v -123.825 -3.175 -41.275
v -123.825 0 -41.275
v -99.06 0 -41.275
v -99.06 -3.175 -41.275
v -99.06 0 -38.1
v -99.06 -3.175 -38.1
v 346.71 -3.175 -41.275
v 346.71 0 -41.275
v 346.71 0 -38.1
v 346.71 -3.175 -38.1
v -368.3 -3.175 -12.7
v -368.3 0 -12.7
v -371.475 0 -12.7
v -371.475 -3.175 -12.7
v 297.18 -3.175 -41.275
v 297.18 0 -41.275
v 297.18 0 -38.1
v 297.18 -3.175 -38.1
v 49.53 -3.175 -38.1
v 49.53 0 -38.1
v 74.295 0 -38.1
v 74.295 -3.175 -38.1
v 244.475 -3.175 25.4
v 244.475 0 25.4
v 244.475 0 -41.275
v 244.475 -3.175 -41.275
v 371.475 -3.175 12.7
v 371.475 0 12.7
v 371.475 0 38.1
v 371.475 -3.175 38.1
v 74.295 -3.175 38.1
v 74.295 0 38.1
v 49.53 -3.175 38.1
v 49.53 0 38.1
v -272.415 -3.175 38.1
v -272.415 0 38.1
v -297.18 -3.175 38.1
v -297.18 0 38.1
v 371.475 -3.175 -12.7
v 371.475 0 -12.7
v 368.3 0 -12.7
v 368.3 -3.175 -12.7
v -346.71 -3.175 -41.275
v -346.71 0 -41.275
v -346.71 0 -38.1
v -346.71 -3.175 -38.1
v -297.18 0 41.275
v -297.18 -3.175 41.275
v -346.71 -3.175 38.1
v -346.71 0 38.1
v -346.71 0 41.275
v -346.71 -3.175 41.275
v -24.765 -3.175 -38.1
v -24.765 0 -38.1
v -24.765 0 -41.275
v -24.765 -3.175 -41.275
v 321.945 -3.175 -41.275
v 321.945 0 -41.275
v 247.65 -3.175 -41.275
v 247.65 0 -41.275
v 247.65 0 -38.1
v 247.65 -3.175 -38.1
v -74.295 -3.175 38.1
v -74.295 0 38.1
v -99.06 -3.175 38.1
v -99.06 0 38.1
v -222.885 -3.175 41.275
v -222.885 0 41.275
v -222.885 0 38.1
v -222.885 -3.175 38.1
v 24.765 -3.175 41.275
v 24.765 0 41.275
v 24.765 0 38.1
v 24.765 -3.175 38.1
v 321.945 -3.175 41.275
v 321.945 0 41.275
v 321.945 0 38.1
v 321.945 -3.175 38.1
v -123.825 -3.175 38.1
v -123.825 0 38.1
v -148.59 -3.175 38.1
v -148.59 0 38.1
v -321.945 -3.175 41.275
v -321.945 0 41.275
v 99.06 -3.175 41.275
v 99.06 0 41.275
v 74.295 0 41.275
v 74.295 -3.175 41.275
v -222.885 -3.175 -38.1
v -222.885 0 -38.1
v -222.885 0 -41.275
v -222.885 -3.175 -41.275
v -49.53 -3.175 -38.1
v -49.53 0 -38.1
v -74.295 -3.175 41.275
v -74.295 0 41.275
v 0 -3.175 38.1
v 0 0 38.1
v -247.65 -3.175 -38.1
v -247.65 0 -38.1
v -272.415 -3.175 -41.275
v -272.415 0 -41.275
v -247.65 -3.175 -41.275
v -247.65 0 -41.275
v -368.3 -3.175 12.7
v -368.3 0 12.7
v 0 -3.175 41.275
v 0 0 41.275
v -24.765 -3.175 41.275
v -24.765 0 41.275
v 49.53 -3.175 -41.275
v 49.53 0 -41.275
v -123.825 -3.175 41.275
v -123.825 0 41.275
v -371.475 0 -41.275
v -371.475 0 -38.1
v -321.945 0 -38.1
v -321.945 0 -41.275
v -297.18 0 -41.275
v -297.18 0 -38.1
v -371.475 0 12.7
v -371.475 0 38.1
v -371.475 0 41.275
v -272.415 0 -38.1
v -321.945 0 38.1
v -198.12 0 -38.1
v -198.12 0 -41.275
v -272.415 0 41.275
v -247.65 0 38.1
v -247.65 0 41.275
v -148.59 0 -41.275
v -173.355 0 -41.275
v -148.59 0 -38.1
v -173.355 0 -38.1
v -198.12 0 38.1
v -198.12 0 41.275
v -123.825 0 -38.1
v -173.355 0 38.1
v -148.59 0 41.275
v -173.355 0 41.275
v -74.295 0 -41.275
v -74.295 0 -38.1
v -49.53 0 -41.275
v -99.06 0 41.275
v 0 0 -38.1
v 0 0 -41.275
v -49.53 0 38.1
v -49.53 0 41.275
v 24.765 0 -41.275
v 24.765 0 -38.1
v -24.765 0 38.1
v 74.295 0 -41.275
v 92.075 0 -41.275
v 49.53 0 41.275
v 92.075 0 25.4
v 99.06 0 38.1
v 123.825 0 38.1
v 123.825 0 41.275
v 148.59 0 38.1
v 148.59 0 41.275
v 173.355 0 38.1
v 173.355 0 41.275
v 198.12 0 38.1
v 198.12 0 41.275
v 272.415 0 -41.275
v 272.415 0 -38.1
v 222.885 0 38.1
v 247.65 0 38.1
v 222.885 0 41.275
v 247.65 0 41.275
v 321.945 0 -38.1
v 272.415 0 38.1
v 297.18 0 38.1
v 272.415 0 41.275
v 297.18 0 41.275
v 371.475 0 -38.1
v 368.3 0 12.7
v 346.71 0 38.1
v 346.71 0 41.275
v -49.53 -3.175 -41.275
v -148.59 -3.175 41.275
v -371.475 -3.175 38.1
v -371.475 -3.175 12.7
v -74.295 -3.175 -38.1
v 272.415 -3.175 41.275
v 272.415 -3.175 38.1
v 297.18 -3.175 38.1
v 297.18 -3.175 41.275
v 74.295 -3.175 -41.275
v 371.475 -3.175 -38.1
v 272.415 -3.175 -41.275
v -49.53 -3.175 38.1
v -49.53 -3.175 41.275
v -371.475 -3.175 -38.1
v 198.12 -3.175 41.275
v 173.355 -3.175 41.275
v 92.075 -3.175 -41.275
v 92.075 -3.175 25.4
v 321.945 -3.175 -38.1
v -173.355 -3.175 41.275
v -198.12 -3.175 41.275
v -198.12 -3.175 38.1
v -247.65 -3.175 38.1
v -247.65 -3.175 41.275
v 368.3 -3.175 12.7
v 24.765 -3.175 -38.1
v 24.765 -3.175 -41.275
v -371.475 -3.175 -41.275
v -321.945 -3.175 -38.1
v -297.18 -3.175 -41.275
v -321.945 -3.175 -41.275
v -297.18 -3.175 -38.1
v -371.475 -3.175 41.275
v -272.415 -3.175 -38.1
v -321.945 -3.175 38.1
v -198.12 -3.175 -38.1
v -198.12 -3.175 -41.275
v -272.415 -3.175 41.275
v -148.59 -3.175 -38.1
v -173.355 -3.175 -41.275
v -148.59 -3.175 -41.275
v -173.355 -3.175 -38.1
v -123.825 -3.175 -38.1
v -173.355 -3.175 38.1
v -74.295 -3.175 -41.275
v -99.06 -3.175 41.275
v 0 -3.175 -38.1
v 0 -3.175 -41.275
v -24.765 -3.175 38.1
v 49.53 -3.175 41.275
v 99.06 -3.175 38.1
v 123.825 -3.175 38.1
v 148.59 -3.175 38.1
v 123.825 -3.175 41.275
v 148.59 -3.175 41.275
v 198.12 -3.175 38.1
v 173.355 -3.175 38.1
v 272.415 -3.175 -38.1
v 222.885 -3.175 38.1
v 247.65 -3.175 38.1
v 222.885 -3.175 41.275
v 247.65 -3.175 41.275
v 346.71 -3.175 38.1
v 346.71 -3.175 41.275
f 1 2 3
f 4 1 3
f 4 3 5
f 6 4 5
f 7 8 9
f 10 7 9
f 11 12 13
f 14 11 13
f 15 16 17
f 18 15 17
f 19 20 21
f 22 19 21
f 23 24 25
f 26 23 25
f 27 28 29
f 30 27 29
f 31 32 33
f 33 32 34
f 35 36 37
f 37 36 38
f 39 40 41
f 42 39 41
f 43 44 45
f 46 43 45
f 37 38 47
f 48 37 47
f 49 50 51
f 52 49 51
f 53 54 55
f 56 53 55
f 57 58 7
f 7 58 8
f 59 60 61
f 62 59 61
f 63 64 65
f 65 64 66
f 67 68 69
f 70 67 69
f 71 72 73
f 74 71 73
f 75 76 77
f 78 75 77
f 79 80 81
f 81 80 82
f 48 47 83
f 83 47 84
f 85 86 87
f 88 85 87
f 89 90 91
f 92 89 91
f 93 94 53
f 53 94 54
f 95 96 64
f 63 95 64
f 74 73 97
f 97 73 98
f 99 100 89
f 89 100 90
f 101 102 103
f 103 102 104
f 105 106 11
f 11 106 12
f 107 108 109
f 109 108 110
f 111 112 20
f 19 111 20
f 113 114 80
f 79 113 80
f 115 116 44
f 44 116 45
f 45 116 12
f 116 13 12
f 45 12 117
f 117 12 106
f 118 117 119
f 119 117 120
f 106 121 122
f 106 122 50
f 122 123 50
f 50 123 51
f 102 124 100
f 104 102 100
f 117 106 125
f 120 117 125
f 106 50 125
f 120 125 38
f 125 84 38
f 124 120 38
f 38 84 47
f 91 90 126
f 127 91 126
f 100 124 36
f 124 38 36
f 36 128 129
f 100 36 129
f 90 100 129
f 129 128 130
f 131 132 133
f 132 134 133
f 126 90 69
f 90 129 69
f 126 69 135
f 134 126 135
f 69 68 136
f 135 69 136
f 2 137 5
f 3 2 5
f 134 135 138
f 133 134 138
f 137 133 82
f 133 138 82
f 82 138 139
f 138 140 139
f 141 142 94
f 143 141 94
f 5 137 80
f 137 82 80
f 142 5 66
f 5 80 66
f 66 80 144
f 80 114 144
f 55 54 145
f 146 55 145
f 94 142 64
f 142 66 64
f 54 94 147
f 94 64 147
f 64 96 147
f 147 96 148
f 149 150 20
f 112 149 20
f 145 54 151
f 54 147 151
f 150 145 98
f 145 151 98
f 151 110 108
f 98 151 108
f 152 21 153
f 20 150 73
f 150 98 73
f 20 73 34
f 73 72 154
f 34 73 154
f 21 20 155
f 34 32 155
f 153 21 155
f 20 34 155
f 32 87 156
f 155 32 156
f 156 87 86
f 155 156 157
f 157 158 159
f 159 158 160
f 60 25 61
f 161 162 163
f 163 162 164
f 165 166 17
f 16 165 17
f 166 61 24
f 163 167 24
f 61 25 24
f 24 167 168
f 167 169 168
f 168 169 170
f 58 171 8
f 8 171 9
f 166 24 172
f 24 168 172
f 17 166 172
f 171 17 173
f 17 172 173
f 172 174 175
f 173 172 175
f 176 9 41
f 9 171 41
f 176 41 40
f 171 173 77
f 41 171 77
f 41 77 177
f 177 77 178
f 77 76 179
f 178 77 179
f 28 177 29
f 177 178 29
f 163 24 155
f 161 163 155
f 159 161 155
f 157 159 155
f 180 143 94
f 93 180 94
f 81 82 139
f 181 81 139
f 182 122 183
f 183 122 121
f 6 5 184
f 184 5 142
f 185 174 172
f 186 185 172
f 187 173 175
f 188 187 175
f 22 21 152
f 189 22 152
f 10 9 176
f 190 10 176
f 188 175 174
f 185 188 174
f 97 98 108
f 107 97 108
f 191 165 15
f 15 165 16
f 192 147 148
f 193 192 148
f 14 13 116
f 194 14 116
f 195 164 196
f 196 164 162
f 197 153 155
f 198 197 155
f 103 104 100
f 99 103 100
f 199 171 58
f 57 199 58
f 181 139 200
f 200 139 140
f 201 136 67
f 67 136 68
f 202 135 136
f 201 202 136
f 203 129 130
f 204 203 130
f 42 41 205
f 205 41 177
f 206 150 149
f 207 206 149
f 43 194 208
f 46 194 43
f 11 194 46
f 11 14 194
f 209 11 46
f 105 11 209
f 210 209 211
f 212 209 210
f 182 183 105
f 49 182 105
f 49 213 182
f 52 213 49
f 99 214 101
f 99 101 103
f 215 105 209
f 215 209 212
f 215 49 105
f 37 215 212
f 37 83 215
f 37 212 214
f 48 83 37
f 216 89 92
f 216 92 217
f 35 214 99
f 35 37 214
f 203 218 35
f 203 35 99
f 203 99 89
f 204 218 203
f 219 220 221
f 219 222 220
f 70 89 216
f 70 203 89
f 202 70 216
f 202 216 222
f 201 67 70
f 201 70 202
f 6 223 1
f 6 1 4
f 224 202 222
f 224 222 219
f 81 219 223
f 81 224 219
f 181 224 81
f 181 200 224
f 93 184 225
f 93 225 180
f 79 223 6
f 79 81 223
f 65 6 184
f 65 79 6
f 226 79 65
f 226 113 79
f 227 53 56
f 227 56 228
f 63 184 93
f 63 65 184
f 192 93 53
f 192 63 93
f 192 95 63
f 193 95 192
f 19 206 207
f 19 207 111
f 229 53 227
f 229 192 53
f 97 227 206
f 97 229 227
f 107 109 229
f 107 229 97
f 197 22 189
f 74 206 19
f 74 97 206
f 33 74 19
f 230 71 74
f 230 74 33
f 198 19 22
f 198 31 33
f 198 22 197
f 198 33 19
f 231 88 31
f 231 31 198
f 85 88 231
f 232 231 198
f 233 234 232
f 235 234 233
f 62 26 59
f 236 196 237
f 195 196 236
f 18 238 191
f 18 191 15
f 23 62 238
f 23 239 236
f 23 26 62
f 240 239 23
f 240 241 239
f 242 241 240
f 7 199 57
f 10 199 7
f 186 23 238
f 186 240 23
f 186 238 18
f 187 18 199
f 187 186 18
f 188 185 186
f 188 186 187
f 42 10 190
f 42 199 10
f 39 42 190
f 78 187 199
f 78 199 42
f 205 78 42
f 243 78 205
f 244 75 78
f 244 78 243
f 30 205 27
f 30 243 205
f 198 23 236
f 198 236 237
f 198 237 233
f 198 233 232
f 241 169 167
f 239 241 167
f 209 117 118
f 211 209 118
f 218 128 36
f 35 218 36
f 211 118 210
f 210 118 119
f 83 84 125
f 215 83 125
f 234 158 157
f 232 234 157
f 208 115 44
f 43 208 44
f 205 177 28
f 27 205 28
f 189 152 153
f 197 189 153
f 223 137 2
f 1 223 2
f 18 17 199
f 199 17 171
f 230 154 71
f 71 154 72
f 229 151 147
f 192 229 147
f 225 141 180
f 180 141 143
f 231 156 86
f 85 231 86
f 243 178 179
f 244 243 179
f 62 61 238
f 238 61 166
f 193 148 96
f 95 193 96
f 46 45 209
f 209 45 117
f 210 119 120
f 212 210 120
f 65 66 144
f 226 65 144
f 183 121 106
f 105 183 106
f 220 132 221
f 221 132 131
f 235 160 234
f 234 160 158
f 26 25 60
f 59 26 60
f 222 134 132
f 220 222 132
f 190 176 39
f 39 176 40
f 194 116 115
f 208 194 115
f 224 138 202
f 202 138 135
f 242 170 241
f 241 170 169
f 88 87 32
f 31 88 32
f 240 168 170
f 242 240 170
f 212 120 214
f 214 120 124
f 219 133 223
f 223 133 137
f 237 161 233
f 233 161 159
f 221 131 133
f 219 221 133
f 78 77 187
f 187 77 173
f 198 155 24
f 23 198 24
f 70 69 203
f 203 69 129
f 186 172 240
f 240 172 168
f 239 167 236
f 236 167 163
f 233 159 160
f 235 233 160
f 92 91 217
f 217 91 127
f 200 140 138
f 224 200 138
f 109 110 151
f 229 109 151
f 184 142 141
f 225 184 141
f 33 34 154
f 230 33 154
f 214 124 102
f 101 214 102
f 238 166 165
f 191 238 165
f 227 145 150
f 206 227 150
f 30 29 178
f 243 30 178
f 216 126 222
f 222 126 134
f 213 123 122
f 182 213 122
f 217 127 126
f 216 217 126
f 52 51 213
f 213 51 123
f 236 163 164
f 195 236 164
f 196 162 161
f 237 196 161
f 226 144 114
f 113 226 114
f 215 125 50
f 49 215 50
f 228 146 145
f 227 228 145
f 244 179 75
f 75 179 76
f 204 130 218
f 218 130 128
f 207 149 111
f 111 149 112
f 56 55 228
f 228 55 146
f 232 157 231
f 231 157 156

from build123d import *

# Parameters (mm, degrees)
F1_DEPTH = 3.175


# Not quite as in the source:
# - ends of sketch curves that miss each other by under 0.0002 mm in the source are joined


with BuildPart() as f1:
    # F0 (on Front) → F1 (new body)
    with BuildSketch(Plane.XZ):
        Polygon((92.075, 25.4), (244.475, 25.4), (244.475, -38.1), (244.475, -41.2750032454), (247.649968335, -41.2750032454), (247.649968335, -38.1000032454), (272.414968335, -38.1000032454), (272.414968335, -41.2750032454), (297.179968335, -41.2750032454), (297.179968335, -38.1000032454), (321.944968335, -38.1000032454), (321.944968335, -41.2750032454), (346.709968335, -41.2750032453), (346.709968335, -38.1000032454), (371.474968335, -38.0999963909), (371.475, -12.7), (368.3, -12.7), (368.3, 12.7), (371.475, 12.7), (371.475, 38.1), (368.3, 38.1), (346.7100335276, 38.1), (346.7100335276, 41.2750068545), (321.9450335276, 41.2750068544), (321.9450335276, 38.1000068545), (297.1800335276, 38.1000068545), (297.1800335276, 41.2750068545), (272.4150335276, 41.2750068545), (272.4150335276, 38.1000068545), (247.6500335276, 38.1000068545), (247.6500335276, 41.2750068545), (222.8850335276, 41.2750068545), (222.8850335276, 38.1000068545), (198.1200335276, 38.1000068545), (198.1200335276, 41.2750068545), (173.3550335276, 41.2750068545), (173.3550335276, 38.1000068545), (148.5900335276, 38.1000068545), (148.5900335276, 41.2750068545), (123.8250335276, 41.2750068545), (123.8250335276, 38.1000068545), (99.0600335276, 38.1000068545), (99.0600335276, 41.2750068545), (74.2950335276, 41.2750068545), (74.2950335276, 38.1000068545), (49.5300335276, 38.1000068545), (49.5300335276, 41.2750068545), (24.7650335276, 41.2750068545), (24.7650335276, 38.1000068545), (3.35276e-05, 38.1000068545), (3.35276e-05, 41.2750068545), (-24.7649664724, 41.2750068545), (-24.7649664724, 38.1000068545), (-49.5299664724, 38.1000068545), (-49.5299664724, 41.2750068545), (-74.2949664724, 41.2750068545), (-74.2949664724, 38.1000068545), (-99.0599664724, 38.1000068545), (-99.0599664724, 41.2750068545), (-123.8249664724, 41.2750068545), (-123.8249664724, 38.1000068545), (-148.5899664724, 38.1000068545), (-148.5899664724, 41.2750068545), (-173.3549664724, 41.2750068545), (-173.3549664724, 38.1000068545), (-198.1199664724, 38.1000068545), (-198.1199664724, 41.2750068545), (-222.8849664724, 41.2750068545), (-222.8849664724, 38.1000068545), (-247.6499664724, 38.1000068545), (-247.6499664724, 41.2750068545), (-272.4149664724, 41.2750068545), (-272.4149664724, 38.1000068545), (-297.1799664724, 38.1000068545), (-297.1799664724, 41.2750068545), (-321.9449664724, 41.2750068545), (-321.9449664724, 38.1000068545), (-346.7099664724, 38.1000068545), (-346.7099664724, 41.2750068545), (-371.4749664724, 41.2750068545), (-371.475, 38.1), (-371.475, 12.7), (-368.3, 12.7), (-368.3, -12.7), (-371.475, -12.7), (-371.475, -38.1), (-371.475031665, -41.2750032454), (-346.710031665, -41.2750032454), (-346.710031665, -38.1000032454), (-321.945031665, -38.1000032454), (-321.945031665, -41.2750032454), (-297.180031665, -41.2750032454), (-297.180031665, -38.1000032454), (-272.415031665, -38.1000032454), (-272.415031665, -41.2750032454), (-247.650031665, -41.2750032454), (-247.650031665, -38.1000032454), (-222.885031665, -38.1000032454), (-222.885031665, -41.2750032454), (-198.120031665, -41.2750032454), (-198.120031665, -38.1000032454), (-173.355031665, -38.1000032454), (-173.355031665, -41.2750032454), (-148.590031665, -41.2750032454), (-148.590031665, -38.1000032454), (-123.825031665, -38.1000032454), (-123.825031665, -41.2750032454), (-99.060031665, -41.2750032454), (-99.060031665, -38.1000032454), (-74.295031665, -38.1000032454), (-74.295031665, -41.2750032454), (-49.530031665, -41.2750032454), (-49.530031665, -38.1000032454), (-24.765031665, -38.1000032454), (-24.765031665, -41.2750032454), (-3.1665e-05, -41.2750032454), (-3.1665e-05, -38.1000032454), (24.764968335, -38.1000032454), (24.764968335, -41.2750032454), (49.529968335, -41.2750032454), (49.529968335, -38.1000032454), (74.294968335, -38.1000032454), (74.294968335, -41.2750032454), (92.075, -41.2750032454), (92.075, -38.1), align=None)
    extrude(amount=F1_DEPTH)


solid = f1.part
